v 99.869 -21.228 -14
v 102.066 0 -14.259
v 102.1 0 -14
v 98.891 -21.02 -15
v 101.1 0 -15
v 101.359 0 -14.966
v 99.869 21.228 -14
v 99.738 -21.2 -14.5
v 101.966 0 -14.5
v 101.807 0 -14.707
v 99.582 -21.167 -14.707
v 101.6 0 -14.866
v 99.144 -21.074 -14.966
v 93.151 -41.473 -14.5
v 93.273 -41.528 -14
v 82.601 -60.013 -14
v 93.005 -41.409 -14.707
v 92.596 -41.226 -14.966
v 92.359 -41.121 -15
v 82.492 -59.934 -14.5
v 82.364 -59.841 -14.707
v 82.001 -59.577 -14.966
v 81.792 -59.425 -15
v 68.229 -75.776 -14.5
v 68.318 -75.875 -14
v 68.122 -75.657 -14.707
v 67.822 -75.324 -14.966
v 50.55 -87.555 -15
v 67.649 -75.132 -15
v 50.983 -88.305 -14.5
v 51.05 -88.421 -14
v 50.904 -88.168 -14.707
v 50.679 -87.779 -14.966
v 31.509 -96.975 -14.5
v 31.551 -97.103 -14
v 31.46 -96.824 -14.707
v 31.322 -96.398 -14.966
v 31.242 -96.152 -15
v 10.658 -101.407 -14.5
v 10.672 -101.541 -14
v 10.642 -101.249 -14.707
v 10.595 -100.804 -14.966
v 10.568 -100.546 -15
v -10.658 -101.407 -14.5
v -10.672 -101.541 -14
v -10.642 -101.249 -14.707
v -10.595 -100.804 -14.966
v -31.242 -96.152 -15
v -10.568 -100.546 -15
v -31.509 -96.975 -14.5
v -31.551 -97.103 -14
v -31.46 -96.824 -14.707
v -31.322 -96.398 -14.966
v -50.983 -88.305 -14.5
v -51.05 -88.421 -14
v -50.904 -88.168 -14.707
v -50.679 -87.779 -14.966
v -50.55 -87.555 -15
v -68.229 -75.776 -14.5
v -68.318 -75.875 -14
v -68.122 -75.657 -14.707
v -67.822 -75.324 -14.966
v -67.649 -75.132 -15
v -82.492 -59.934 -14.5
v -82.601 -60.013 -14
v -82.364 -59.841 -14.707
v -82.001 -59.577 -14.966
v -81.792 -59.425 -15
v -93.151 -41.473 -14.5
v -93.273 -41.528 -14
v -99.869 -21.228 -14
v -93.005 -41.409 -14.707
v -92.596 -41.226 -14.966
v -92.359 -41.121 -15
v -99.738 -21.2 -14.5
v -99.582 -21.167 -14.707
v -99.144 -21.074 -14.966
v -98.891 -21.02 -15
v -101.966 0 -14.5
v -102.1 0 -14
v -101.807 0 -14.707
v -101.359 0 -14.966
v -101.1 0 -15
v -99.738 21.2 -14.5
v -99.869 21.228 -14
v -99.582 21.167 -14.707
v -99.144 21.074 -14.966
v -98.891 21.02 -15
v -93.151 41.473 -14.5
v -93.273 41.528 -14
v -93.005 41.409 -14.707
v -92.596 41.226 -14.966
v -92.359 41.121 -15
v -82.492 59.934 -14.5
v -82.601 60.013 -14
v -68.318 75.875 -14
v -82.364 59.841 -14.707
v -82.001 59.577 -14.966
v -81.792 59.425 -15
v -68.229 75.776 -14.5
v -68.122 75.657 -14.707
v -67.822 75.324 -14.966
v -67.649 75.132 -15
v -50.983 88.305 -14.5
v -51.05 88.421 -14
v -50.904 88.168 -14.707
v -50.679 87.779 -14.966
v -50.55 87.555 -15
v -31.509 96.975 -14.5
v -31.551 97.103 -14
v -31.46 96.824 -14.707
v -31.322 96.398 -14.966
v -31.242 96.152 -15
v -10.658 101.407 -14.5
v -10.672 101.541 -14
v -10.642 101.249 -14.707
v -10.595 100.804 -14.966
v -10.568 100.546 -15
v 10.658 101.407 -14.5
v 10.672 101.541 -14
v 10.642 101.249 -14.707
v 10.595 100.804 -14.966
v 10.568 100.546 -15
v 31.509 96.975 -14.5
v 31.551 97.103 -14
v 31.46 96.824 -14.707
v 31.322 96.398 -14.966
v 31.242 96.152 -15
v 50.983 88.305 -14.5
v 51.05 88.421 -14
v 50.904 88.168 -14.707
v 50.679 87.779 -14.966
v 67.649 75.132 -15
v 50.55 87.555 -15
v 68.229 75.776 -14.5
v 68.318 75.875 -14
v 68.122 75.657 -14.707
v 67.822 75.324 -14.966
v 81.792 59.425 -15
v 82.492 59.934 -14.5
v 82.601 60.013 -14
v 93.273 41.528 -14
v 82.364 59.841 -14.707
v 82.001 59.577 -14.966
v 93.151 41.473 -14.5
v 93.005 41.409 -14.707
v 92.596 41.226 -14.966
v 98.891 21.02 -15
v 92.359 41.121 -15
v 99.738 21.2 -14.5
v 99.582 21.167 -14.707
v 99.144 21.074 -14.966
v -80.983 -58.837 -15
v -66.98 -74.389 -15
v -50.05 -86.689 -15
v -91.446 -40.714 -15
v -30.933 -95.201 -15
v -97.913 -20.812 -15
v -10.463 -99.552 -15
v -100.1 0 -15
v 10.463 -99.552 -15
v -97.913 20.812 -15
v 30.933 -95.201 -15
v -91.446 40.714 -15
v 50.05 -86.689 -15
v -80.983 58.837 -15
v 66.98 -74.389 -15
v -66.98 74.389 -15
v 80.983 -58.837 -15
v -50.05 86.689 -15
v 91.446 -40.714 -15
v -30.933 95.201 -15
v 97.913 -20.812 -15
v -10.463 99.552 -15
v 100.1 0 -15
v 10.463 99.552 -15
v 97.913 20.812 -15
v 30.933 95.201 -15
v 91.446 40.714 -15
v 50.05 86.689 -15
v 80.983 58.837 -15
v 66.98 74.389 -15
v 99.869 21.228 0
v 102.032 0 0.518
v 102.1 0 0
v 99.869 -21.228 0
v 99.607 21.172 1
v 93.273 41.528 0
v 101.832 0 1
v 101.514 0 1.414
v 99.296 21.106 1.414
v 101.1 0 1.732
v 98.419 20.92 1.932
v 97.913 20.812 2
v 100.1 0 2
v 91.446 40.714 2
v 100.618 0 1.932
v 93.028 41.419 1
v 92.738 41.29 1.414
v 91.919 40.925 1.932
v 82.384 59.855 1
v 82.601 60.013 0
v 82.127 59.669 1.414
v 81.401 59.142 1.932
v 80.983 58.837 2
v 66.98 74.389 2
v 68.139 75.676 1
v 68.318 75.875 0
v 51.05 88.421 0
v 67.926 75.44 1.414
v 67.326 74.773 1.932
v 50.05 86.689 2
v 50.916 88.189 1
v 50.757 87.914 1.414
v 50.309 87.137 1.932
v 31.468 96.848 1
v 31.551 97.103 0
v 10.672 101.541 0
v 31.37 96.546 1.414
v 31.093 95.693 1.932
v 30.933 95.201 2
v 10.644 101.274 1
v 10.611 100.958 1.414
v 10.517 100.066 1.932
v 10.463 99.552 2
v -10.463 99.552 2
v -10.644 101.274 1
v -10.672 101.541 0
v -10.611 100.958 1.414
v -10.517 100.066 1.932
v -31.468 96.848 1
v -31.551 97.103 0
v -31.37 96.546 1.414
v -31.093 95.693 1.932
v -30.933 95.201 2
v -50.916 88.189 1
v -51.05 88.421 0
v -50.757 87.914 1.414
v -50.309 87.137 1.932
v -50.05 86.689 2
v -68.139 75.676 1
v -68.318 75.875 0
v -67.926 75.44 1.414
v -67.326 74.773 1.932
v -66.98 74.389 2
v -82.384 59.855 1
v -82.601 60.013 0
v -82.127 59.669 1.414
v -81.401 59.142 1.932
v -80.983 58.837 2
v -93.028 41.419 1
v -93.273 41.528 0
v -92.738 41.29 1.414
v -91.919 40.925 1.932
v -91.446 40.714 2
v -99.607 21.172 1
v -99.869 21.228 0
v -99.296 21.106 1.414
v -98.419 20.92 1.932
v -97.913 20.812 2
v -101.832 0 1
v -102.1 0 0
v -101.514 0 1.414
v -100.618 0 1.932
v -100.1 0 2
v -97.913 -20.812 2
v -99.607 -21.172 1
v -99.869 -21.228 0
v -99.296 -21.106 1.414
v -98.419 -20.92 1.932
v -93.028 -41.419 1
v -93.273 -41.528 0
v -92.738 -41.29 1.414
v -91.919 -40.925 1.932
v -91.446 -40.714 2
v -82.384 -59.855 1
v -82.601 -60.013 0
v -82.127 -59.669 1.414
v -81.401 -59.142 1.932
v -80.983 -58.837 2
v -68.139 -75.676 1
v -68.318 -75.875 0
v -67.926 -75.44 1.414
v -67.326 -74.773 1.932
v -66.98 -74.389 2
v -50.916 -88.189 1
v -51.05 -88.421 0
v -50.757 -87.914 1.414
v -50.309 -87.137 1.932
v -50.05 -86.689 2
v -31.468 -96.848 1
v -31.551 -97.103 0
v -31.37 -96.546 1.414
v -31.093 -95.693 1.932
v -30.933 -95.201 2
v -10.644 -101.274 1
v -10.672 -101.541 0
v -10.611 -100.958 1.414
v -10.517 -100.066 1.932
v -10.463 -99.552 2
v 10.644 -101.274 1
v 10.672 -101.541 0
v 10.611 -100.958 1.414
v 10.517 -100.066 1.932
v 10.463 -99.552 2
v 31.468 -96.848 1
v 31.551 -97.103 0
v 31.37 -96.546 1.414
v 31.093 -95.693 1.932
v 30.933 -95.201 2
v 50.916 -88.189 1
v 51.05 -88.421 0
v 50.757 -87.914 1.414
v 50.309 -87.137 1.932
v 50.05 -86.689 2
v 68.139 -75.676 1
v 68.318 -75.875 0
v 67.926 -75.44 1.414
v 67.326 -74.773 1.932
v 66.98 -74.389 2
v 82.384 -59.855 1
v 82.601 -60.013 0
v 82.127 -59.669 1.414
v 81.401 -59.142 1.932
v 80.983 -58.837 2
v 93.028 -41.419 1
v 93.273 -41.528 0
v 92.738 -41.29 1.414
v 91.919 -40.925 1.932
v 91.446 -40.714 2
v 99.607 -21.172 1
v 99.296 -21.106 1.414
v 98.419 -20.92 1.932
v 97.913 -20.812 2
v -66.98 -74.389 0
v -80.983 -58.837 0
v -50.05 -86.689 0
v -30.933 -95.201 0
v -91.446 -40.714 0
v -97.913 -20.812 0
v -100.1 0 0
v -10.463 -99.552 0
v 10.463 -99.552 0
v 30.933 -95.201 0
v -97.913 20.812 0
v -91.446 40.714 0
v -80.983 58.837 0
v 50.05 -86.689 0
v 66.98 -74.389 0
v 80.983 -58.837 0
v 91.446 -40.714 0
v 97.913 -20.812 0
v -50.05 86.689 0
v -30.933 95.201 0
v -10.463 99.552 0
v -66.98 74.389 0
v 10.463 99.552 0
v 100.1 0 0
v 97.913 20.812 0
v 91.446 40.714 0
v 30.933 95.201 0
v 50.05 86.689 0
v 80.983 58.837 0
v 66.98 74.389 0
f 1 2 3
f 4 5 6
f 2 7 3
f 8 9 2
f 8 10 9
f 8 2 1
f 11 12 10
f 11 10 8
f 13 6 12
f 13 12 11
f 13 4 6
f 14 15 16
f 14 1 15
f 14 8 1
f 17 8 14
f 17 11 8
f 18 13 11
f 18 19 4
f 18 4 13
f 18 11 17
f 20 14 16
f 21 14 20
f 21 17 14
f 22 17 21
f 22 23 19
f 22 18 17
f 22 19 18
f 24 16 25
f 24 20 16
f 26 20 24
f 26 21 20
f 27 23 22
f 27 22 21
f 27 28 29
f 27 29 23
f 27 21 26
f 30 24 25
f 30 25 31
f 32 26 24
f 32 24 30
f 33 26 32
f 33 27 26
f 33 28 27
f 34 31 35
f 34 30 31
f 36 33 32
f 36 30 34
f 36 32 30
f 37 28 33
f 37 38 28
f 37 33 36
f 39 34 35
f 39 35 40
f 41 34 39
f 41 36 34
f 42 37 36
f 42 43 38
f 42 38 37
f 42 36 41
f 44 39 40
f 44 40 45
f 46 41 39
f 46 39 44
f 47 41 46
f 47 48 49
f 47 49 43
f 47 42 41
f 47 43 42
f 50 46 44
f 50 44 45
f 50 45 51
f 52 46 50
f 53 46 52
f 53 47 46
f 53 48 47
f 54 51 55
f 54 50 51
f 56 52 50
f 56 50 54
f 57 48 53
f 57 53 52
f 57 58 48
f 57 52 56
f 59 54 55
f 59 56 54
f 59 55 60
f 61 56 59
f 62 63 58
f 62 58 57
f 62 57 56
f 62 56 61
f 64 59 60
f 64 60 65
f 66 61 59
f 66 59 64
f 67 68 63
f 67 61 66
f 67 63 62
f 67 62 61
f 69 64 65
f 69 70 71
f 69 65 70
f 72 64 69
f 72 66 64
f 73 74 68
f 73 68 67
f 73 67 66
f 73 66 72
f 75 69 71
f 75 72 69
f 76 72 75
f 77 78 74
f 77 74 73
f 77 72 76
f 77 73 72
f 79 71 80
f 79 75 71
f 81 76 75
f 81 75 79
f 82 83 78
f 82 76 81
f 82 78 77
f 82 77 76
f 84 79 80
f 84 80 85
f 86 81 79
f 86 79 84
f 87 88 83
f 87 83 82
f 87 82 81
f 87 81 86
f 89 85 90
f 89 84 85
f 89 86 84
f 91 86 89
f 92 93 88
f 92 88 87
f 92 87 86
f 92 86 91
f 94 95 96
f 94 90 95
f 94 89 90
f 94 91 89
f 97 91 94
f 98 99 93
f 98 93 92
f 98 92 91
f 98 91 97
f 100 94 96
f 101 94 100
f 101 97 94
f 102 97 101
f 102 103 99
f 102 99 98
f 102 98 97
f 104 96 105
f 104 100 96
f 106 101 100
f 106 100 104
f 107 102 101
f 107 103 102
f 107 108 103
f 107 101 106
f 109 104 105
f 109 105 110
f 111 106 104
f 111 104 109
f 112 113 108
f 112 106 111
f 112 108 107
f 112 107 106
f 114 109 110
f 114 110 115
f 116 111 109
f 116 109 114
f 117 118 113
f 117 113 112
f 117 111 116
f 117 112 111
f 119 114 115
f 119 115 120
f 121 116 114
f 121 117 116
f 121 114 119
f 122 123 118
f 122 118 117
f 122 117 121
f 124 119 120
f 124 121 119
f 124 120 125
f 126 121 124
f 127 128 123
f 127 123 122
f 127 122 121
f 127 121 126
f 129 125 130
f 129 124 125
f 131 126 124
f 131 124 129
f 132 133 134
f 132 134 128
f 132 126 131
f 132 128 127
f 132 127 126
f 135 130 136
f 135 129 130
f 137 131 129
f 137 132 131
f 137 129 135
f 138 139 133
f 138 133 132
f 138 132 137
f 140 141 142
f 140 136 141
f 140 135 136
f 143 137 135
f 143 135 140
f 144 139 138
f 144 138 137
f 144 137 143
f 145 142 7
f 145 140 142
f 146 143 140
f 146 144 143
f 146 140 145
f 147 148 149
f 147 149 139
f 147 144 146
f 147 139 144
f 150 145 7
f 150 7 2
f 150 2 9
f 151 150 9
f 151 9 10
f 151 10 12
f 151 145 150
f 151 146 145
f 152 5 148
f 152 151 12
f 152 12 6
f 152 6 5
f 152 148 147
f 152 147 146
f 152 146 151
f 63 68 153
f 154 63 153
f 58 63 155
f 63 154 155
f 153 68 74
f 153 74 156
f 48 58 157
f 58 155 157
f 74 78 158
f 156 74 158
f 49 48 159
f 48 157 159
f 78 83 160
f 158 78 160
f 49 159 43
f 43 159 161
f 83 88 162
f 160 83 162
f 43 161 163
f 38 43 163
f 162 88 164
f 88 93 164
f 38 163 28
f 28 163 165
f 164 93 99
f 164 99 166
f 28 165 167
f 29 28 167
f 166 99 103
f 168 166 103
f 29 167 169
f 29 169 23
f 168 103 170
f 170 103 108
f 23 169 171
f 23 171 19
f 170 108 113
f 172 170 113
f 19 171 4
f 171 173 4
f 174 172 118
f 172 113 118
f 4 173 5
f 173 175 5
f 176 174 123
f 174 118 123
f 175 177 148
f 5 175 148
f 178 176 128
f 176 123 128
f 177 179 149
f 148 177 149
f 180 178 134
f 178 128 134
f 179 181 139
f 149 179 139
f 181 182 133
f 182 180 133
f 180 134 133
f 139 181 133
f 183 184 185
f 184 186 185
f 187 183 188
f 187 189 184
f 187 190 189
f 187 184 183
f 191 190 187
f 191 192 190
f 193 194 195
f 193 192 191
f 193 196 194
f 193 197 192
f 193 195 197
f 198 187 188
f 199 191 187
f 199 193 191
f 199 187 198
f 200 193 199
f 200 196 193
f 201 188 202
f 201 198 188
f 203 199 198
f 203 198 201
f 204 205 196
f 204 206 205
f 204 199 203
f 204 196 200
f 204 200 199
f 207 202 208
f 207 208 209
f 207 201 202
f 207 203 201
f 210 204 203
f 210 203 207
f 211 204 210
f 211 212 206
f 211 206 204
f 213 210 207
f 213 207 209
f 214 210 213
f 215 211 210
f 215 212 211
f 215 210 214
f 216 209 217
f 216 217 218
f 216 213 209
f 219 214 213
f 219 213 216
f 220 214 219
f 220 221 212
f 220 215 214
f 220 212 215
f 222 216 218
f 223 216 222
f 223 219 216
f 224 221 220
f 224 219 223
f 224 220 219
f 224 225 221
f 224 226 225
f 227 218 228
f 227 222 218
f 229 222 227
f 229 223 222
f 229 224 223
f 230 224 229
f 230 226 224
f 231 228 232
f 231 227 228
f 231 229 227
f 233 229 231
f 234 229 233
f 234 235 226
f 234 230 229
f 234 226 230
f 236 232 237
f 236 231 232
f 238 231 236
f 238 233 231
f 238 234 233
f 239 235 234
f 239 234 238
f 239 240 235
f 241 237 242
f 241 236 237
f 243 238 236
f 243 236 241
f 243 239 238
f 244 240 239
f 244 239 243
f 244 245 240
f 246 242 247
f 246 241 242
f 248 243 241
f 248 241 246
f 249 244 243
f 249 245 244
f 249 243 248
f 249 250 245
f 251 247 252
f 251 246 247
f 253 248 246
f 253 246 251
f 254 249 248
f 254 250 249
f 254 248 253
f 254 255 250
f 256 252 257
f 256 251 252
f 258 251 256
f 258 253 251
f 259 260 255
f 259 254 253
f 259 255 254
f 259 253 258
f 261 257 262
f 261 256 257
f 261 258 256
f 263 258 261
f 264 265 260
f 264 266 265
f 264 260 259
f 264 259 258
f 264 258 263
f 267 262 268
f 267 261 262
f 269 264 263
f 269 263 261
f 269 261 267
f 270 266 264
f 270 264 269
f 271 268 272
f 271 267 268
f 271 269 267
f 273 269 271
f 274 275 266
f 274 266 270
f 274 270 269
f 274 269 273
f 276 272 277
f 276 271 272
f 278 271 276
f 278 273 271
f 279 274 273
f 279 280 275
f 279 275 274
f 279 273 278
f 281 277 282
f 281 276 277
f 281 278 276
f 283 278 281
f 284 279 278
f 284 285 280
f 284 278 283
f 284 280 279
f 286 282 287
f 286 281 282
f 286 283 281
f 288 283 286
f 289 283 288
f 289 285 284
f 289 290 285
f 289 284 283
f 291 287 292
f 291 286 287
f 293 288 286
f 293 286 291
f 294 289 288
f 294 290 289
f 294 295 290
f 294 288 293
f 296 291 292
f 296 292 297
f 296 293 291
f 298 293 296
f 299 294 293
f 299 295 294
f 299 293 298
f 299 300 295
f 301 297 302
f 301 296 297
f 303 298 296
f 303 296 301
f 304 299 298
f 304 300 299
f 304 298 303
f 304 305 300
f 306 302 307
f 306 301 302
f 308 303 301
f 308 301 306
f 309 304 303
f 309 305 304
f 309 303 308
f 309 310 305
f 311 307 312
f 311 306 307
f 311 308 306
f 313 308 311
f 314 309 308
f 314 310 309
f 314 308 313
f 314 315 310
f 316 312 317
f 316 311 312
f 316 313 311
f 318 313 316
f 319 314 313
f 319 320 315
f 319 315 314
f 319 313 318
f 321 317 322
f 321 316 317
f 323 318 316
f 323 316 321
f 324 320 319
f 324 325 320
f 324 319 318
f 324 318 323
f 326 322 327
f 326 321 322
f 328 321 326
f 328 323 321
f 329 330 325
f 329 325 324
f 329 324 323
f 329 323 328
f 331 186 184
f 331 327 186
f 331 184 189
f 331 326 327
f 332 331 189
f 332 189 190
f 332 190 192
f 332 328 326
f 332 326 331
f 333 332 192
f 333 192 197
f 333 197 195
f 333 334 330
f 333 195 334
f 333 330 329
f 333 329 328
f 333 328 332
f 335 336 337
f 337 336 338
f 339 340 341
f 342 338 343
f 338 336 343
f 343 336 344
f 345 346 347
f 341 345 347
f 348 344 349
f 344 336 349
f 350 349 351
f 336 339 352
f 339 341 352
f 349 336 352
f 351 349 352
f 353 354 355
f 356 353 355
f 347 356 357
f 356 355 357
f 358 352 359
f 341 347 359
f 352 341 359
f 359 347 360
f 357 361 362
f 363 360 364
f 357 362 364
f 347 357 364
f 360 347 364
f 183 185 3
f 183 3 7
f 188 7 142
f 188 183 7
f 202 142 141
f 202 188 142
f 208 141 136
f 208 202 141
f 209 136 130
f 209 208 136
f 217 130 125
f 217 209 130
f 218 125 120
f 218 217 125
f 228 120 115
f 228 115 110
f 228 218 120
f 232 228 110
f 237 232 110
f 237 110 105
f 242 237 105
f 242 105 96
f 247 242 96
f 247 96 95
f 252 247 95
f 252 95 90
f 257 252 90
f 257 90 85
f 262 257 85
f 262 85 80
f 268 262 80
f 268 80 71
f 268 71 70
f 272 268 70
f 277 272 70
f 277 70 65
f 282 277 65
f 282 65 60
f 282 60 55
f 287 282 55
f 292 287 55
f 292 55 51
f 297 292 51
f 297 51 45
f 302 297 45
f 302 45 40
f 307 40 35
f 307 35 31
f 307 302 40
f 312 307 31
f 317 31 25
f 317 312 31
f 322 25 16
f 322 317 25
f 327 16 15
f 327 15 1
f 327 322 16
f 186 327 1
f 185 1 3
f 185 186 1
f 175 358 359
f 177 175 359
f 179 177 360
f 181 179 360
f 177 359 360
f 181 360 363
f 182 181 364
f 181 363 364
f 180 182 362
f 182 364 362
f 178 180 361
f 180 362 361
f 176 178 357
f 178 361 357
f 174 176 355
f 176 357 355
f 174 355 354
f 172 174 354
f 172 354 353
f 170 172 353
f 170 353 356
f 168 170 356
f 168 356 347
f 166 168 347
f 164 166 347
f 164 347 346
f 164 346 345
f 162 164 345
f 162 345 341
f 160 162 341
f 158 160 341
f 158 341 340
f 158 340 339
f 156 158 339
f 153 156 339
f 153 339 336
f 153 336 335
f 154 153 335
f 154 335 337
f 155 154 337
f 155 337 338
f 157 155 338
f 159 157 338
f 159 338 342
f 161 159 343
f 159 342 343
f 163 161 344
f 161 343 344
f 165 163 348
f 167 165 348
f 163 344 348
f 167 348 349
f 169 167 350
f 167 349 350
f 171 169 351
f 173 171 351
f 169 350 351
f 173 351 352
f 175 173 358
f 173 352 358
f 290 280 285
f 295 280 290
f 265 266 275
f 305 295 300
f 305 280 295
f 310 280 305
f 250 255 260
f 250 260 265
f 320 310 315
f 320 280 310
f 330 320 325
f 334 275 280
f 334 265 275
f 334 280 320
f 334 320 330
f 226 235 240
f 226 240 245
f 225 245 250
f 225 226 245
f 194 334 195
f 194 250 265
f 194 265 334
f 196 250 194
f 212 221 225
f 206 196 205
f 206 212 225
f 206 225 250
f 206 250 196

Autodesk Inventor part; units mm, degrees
ref_plane "YZ Plane" through (0, 0, 0) normal (1, 0, 0) x (0, 1, 0)
ref_plane "XZ Plane" through (0, 0, 0) normal (0, 1, 0) x (-1, 0, 0)
ref_plane "XY Plane" through (0, 0, 0) normal (0, 0, 1) x (1, 0, 0)
sketch "Sketch1" plane through (0, 0, 0) normal (0, 0, 1) x (1, 0, 0)
  circle A0 centre (0, 0) radius 100 construction
  circle A1 centre (0, 0) radius 100.1
  circle A2 centre (0, 0) radius 102.1
  point P0 (0, 0)
  dimension "d0" = 0.1
  dimension "d1" = 2
extrude "Extrusion1" add sketch "Sketch1" against normal blind 15
sketch "Sketch2" plane through (0, 0, 0) normal (0, 0, 1) x (1, 0, 0)
  circle A0 centre (0, 0) radius 102.1 projected
  point P0 (0, 0)
extrude "Extrusion2" add sketch "Sketch2" along normal blind 2
fillet "Fillet1" radius 1 1 edges at (-102.1, 0, -15)
fillet "Fillet1" radius 2 1 edges at (-102.1, 0, 2)
properties part number "cap_v2"
